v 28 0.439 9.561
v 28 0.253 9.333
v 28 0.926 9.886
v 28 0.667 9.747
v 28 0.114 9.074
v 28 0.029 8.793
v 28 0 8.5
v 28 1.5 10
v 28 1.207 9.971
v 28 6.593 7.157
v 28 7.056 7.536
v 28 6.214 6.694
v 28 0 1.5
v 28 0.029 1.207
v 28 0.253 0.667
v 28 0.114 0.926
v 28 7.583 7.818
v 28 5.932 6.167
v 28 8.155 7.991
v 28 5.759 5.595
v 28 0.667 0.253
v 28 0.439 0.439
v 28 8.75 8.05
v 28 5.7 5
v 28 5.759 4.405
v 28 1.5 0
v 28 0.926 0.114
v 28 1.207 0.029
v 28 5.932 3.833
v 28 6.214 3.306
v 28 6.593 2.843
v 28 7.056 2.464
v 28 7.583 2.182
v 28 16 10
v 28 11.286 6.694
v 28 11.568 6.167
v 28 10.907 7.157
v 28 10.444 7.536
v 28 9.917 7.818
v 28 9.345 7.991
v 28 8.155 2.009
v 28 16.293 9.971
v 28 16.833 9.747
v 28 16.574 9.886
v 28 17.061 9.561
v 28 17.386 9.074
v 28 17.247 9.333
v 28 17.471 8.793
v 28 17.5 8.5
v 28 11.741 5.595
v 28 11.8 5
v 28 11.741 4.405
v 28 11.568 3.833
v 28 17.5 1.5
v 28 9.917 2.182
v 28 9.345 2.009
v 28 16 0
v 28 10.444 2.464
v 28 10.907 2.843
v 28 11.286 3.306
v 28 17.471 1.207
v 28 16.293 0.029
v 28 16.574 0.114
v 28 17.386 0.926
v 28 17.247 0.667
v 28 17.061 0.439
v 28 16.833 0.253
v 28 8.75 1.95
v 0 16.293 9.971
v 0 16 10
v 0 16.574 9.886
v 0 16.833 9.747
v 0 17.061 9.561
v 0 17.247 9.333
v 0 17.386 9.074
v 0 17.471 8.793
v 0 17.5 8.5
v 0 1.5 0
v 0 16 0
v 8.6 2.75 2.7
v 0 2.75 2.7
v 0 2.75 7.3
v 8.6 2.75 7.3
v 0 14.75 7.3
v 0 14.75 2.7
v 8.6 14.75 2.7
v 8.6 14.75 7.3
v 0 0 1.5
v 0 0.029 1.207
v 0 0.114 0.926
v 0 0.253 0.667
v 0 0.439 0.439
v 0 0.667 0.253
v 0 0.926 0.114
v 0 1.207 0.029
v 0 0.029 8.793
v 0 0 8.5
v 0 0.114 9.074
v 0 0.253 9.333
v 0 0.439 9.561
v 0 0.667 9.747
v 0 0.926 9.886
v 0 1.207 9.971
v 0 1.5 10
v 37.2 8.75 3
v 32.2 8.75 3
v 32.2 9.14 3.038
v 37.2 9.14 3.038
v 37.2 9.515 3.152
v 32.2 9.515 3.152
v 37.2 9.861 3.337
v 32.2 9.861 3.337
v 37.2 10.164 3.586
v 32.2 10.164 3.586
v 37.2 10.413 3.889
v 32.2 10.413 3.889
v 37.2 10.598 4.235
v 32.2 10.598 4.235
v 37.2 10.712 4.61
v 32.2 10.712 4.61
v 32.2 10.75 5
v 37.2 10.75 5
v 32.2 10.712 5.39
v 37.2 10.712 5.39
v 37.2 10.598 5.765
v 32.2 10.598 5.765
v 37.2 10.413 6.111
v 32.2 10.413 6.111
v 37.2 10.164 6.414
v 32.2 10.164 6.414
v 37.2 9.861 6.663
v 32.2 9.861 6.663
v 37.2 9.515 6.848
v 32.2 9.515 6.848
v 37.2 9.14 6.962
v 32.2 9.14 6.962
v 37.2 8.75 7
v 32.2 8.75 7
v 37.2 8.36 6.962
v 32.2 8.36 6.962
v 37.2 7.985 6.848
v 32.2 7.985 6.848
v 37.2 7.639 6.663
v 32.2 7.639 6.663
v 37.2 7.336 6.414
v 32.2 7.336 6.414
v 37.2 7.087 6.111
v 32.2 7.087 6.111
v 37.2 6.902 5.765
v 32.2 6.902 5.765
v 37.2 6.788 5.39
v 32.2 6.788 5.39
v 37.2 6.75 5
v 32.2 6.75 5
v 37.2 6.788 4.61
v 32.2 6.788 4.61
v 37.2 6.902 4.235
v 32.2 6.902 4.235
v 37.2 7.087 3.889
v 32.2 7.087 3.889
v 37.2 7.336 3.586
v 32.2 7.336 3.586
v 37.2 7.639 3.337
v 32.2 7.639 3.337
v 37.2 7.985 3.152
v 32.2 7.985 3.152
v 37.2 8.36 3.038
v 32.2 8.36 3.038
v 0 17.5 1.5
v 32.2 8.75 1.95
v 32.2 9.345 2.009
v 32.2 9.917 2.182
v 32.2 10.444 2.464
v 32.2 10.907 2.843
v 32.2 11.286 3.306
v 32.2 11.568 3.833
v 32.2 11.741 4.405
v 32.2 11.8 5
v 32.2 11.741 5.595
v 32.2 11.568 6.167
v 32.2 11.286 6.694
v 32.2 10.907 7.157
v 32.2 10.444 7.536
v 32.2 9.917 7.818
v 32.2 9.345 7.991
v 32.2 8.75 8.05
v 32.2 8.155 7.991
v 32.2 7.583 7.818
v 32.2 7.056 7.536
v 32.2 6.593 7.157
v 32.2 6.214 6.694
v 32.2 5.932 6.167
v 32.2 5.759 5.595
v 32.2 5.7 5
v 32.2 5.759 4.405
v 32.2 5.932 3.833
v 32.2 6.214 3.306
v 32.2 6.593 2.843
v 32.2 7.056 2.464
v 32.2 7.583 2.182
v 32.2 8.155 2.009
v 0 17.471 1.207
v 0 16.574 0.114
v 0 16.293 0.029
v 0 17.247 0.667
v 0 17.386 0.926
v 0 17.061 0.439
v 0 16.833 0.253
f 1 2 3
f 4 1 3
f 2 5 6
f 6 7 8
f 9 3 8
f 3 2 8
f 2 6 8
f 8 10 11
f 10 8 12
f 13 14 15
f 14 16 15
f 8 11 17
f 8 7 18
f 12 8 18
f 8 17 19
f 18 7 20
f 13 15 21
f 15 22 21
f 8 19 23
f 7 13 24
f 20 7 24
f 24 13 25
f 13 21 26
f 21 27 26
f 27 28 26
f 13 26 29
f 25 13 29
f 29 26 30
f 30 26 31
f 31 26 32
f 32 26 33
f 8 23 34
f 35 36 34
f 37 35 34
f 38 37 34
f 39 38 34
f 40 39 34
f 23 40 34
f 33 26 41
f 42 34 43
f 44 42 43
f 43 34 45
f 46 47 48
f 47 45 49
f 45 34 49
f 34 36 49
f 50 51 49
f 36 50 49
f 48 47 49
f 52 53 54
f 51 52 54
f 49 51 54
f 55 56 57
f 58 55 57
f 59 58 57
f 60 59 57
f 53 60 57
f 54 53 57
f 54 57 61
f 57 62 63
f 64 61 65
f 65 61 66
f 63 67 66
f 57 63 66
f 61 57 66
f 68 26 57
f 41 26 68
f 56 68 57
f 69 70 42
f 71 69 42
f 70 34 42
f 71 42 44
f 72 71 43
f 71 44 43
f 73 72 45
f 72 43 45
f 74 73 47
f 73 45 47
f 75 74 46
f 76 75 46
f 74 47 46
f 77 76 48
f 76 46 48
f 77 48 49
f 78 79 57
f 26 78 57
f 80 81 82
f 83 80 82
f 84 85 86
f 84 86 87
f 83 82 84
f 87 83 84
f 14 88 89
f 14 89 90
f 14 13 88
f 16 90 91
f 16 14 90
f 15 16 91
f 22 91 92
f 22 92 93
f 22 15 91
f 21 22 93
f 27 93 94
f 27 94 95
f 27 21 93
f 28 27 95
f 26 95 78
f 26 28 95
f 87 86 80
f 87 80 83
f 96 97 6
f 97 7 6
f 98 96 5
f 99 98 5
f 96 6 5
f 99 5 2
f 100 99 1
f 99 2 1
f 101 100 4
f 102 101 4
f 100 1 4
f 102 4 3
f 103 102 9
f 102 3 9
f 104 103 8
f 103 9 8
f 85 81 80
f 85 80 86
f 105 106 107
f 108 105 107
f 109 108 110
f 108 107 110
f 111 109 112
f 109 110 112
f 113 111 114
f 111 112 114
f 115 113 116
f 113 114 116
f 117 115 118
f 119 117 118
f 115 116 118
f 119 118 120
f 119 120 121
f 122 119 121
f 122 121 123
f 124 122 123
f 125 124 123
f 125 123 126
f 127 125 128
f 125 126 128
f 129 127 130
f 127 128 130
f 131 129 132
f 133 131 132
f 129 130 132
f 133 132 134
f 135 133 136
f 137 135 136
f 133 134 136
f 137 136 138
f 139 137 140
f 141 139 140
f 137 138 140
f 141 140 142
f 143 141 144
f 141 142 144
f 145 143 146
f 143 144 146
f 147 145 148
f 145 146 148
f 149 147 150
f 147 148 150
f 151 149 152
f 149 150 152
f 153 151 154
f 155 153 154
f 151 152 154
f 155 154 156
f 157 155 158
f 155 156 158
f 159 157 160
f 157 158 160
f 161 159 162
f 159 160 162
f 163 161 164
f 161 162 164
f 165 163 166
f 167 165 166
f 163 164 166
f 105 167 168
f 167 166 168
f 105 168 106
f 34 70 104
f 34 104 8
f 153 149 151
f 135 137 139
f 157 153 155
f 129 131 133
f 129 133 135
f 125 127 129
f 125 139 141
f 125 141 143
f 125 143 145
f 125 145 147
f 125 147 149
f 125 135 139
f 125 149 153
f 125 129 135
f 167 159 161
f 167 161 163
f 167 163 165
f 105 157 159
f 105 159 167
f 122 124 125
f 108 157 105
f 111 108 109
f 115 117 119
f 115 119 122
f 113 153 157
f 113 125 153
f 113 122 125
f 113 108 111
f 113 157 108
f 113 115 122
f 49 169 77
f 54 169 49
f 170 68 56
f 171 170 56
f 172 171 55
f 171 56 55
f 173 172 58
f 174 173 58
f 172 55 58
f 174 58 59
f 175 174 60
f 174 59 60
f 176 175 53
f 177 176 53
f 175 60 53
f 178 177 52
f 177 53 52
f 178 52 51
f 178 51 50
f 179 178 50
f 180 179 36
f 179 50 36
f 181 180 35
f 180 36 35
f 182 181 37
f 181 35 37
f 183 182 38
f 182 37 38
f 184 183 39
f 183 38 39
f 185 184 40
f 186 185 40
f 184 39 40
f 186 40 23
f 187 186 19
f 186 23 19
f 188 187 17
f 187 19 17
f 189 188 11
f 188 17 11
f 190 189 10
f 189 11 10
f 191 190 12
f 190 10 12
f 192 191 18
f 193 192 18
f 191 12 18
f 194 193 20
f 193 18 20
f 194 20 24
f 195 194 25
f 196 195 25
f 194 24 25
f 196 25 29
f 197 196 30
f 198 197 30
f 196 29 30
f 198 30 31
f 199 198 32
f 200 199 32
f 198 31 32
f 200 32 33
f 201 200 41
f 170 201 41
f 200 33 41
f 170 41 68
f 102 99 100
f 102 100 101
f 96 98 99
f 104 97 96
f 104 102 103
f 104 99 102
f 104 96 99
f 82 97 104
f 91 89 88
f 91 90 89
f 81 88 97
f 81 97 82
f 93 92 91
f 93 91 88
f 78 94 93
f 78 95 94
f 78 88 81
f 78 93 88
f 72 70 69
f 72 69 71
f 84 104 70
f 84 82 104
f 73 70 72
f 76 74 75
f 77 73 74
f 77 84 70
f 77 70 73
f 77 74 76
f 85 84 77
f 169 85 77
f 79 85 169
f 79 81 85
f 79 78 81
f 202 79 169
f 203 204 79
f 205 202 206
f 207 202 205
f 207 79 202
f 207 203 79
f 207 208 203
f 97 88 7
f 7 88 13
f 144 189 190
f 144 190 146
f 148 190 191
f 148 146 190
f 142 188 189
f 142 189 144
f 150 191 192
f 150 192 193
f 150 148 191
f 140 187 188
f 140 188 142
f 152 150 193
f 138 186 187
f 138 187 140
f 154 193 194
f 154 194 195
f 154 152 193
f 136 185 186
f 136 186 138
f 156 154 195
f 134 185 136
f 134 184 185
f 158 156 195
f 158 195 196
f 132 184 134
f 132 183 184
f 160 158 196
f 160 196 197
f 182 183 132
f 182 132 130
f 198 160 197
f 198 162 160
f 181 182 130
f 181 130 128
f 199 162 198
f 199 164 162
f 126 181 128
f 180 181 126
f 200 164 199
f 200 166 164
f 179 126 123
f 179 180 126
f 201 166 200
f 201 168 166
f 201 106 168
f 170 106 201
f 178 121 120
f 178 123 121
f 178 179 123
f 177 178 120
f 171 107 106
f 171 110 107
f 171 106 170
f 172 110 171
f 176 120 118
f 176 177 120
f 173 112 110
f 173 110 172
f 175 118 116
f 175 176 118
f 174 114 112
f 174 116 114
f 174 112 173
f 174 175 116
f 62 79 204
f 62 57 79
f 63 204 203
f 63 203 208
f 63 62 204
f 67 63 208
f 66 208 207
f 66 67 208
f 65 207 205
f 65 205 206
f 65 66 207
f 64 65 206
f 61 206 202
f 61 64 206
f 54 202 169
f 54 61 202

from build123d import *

# Parameters (mm, degrees)
SKETCH1_W           = 28
SKETCH1_H           = 17.5
BOSS_EXTRUDE1_DEPTH = 10
SKETCH3_W           = 4.6
SKETCH3_H           = 12
CUT_EXTRUDE1_DEPTH  = 8.6
SKETCH4_R           = 3.05
BOSS_EXTRUDE2_DEPTH = 4.2
SKETCH5_R           = 2
BOSS_EXTRUDE3_DEPTH = 5
FILLET1_R           = 1.5


with BuildPart() as part:
    # Sketch1 → Boss-Extrude1 (new body)
    with BuildSketch(Plane.XY):
        with Locations((14, 8.75)):
            Rectangle(SKETCH1_W, SKETCH1_H)
    extrude(amount=BOSS_EXTRUDE1_DEPTH)

    # Sketch3 → Cut-Extrude1 (cut)
    with BuildSketch(Plane.ZY):
        with Locations((5, 8.75)):
            Rectangle(SKETCH3_W, SKETCH3_H)
    extrude(amount=-CUT_EXTRUDE1_DEPTH, mode=Mode.SUBTRACT)

    # Sketch4 → Boss-Extrude2 (add)
    with BuildSketch(Plane(origin=(28, 0, 0), x_dir=(0, 0, -1), z_dir=(1, 0, 0))):
        with Locations((-5, 8.75)):
            Circle(SKETCH4_R)
    extrude(amount=BOSS_EXTRUDE2_DEPTH)

    # Sketch5 → Boss-Extrude3 (add)
    with BuildSketch(Plane(origin=(32.2, 0, 0), x_dir=(0, 0, -1), z_dir=(1, 0, 0))):
        with Locations((-5, 8.75)):
            Circle(SKETCH5_R)
    extrude(amount=BOSS_EXTRUDE3_DEPTH)

    # Fillet1
    fillet1_edges = [part.edges().sort_by_distance(p)[0] for p in [
        (14, 17.5, 10),
        (14, 17.5, 0),
        (14, 0, 0),
        (14, 0, 10),
    ]]
    fillet(fillet1_edges, radius=FILLET1_R)


solid = part.part
